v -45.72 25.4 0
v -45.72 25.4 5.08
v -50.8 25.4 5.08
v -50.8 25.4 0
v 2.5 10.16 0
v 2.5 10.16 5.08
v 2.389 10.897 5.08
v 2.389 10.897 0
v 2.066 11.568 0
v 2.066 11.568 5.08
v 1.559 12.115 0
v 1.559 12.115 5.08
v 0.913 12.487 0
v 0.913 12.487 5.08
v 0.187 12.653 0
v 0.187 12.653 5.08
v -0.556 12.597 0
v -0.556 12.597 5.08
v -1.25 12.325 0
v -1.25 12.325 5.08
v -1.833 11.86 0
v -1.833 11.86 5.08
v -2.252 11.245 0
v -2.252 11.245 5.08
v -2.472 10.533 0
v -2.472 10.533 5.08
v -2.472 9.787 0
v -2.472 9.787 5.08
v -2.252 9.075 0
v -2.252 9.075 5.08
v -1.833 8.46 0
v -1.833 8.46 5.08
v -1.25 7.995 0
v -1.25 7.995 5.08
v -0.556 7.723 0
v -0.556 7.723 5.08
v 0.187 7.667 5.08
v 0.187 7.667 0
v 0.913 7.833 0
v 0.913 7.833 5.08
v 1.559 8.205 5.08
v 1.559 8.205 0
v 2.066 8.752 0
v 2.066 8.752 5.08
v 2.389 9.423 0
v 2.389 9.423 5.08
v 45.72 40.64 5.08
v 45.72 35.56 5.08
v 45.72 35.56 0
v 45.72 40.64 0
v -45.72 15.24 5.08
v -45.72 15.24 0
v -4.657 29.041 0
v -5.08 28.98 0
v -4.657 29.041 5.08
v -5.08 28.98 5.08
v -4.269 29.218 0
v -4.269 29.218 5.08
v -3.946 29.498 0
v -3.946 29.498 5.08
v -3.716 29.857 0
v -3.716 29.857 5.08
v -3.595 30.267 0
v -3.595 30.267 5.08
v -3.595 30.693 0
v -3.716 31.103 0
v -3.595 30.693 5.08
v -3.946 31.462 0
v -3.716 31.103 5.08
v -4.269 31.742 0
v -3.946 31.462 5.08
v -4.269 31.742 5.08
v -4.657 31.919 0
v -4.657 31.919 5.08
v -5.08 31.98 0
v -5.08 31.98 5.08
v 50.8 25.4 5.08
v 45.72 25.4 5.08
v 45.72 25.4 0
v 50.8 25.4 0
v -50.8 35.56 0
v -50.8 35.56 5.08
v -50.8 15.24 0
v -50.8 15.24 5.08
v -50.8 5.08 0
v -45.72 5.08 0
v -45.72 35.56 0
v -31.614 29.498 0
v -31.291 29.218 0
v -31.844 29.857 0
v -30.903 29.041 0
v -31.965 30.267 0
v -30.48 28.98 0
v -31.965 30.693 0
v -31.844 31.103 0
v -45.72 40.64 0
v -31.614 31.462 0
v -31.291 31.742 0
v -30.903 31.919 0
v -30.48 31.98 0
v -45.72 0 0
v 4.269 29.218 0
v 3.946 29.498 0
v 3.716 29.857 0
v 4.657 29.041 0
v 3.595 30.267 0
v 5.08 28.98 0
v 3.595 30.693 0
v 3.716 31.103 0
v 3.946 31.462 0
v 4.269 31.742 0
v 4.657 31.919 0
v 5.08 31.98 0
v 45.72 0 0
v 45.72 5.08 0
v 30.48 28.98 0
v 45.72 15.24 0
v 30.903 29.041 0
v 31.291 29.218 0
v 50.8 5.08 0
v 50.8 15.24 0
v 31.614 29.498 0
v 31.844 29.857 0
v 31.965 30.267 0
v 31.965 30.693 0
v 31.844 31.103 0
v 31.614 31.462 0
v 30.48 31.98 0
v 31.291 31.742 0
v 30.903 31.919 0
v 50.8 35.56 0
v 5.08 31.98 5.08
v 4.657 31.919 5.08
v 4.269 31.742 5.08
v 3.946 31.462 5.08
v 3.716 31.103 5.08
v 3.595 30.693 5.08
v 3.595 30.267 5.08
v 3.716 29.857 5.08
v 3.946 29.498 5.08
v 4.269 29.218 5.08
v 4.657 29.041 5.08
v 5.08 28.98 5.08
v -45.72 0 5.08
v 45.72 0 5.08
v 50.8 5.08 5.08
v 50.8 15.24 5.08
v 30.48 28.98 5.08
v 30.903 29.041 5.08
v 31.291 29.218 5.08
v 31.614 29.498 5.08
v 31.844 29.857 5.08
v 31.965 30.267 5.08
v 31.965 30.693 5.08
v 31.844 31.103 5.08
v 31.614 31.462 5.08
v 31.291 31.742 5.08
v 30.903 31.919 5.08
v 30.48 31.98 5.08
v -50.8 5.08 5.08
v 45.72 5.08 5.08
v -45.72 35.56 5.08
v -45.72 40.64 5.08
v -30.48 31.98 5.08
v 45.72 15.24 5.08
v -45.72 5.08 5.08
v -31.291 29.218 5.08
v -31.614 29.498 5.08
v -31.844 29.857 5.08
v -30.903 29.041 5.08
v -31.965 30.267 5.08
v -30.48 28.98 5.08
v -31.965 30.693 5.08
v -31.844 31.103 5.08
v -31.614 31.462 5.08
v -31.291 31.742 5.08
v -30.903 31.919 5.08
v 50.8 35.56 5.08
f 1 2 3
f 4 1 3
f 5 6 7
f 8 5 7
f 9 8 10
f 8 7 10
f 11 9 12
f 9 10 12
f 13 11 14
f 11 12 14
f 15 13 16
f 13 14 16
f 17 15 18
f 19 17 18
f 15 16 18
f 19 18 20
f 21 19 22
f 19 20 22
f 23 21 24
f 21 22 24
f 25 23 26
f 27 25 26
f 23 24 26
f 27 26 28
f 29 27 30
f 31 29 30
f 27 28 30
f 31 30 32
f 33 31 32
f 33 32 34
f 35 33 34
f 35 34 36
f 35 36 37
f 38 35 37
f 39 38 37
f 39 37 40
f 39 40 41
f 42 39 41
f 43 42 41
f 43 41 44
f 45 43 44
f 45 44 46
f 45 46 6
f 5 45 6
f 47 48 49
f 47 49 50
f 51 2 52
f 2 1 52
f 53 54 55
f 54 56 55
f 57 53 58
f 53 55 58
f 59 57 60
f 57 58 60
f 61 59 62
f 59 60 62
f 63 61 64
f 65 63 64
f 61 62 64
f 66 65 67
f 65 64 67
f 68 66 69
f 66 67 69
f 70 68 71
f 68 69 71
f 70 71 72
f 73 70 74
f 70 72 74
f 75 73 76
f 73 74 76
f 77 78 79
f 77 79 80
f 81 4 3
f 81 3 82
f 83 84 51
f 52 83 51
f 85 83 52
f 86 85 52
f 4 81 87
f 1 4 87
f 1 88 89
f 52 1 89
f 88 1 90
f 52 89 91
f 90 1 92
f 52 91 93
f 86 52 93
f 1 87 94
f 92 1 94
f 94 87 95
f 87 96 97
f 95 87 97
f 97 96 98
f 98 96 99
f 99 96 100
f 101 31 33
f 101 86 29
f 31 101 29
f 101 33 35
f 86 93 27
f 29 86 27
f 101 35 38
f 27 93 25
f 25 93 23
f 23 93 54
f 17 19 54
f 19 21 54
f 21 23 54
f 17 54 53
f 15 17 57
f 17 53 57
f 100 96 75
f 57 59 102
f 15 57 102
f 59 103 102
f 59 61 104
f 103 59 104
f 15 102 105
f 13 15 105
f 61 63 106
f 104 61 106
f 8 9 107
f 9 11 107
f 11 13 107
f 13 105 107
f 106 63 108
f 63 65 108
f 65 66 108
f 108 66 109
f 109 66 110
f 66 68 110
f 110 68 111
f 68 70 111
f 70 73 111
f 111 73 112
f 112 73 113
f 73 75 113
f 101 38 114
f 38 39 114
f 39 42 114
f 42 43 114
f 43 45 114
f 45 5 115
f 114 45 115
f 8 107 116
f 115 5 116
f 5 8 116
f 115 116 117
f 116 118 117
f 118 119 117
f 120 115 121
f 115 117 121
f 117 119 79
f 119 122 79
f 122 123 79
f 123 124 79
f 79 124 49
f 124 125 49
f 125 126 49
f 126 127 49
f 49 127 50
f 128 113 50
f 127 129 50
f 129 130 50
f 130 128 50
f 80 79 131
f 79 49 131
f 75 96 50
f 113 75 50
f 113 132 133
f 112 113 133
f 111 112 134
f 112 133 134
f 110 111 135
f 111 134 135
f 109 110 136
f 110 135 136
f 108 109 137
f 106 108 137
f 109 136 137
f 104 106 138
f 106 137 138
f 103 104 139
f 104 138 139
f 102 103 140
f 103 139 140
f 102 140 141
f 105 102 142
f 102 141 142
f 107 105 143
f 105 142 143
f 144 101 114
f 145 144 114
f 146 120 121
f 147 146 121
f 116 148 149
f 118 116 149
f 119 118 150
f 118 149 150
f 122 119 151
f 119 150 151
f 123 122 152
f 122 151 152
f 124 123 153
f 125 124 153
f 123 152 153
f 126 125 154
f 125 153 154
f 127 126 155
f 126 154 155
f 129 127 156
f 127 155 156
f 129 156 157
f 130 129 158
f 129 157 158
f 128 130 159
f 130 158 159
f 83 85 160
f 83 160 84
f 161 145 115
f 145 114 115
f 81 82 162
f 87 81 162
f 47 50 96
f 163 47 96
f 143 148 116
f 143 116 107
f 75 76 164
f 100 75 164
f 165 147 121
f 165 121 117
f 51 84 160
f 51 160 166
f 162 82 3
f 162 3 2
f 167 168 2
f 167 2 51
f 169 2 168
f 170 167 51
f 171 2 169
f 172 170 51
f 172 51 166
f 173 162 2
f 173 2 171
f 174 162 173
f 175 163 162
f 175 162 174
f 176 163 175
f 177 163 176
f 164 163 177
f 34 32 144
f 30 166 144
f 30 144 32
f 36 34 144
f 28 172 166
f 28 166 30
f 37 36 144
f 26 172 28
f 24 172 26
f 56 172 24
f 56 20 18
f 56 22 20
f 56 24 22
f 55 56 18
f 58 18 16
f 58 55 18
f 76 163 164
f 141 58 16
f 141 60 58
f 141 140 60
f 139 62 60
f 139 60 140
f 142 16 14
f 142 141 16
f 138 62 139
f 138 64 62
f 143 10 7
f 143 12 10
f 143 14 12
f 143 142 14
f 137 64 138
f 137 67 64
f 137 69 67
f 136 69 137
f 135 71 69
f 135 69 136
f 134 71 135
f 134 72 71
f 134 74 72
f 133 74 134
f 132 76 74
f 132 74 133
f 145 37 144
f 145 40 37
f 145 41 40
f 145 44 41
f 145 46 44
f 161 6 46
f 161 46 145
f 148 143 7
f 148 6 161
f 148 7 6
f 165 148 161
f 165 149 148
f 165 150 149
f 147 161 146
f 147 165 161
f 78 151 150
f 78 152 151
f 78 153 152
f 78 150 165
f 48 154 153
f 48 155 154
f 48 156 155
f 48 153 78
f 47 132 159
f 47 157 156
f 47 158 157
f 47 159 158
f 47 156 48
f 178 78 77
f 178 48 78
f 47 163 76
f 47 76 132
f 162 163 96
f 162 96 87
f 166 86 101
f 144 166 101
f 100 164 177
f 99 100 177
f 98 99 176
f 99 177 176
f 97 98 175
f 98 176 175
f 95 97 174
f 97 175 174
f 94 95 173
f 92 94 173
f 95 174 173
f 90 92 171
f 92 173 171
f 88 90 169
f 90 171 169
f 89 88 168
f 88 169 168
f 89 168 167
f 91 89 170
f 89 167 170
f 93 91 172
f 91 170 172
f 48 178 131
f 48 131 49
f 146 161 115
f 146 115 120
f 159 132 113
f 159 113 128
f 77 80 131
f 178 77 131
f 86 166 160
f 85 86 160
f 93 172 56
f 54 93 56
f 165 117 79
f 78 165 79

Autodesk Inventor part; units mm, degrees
ref_plane "YZ Plane" through (0, 0, 0) normal (1, 0, 0) x (0, 1, 0)
ref_plane "XZ Plane" through (0, 0, 0) normal (0, 1, 0) x (-1, 0, 0)
ref_plane "XY Plane" through (0, 0, 0) normal (0, 0, 1) x (1, 0, 0)
sketch "Sketch1" plane through (0, 0, 0) normal (0, 0, 1) x (1, 0, 0)
  line L0 (45.72, 0) -> (45.72, 40.64)
  line L1 (45.72, 40.64) -> (-45.72, 40.64)
  line L2 (-45.72, 40.64) -> (-45.72, 9.301)
  line L3 (-45.72, 5.08) -> (-50.8, 5.08)
  line L4 (-50.8, 5.08) -> (-50.8, 15.24)
  line L5 (-50.8, 15.24) -> (-45.72, 15.24)
  line L6 (-45.72, 15.24) -> (-45.72, 5.08)
  line L7 (-45.72, 25.4) -> (-50.8, 25.4)
  line L8 (-50.8, 25.4) -> (-50.8, 35.56)
  line L9 (-50.8, 35.56) -> (-45.72, 35.56)
  line L10 (-45.72, 35.56) -> (-45.72, 25.4)
  line L11 (-45.72, 45.72) -> (-50.8, 45.72)
  line L12 (-50.8, 45.72) -> (-50.8, 55.88)
  line L13 (-50.8, 55.88) -> (-45.72, 55.88)
  line L14 (-45.72, 55.88) -> (-45.72, 45.72)
  line L15 (0, 40.64) -> (0, 0) construction
  line L16 (45.72, 40.64) -> (45.72, 0)
  line L17 (45.72, 5.08) -> (50.8, 5.08)
  line L18 (50.8, 5.08) -> (50.8, 15.24)
  line L19 (50.8, 15.24) -> (45.72, 15.24)
  line L20 (45.72, 15.24) -> (45.72, 5.08)
  line L21 (45.72, 25.4) -> (50.8, 25.4)
  line L22 (50.8, 25.4) -> (50.8, 35.56)
  line L23 (50.8, 35.56) -> (45.72, 35.56)
  line L24 (45.72, 35.56) -> (45.72, 25.4)
  line L25 (45.72, 45.72) -> (50.8, 45.72)
  line L26 (50.8, 45.72) -> (50.8, 55.88)
  line L27 (50.8, 55.88) -> (45.72, 55.88)
  line L28 (45.72, 55.88) -> (45.72, 45.72)
  line L29 (-45.72, 5.08) -> (-45.72, 0)
  line L30 (-45.72, 0) -> (45.72, 0)
  line L31 (45.72, 40.64) -> (-45.72, 40.64)
  line L32 (-45.72, 40.64) -> (-45.72, 0)
  line L33 (-45.72, 0) -> (45.72, 0)
  line L34 (45.72, 0) -> (45.72, 40.64)
  dimension "d0" = 91.44
  dimension "d2" = 10.16
  dimension "d3" = 5.08
  dimension "d7" = 20.32
  dimension "d14" = 5.08
  dimension "d15" = 40.64
extrude "Extrusion2" add sketch "Sketch1" along normal blind 5.08 contours L30 L29 L6 L2 L1 L0 | L0 L19 L18 L17 | L3 L4 L5 L2 L6 | L0 L23 L22 L21 | L7 L8 L9 L2
sketch "Sketch4" plane through (0, 0, 5.08) normal (0, 0, 1) x (1, 0, 0)
  line L0 (45.72, 40.64) -> (-45.72, 40.64) construction
  line L1 (-30.48, 30.48) -> (-5.08, 30.48)
  line L2 (-30.48, 28.98) -> (-5.08, 28.98)
  line L3 (-5.08, 31.98) -> (-30.48, 31.98)
  arc A0 (-30.48, 31.98) -> (-30.48, 28.98) centre (-30.48, 30.48) ccw
  arc A1 (-5.08, 28.98) -> (-5.08, 31.98) centre (-5.08, 30.48) ccw
  line L4 (30.48, 30.48) -> (5.08, 30.48)
  line L5 (30.48, 28.98) -> (5.08, 28.98)
  line L6 (5.08, 31.98) -> (30.48, 31.98)
  arc A2 (30.48, 28.98) -> (30.48, 31.98) centre (30.48, 30.48) ccw
  arc A3 (5.08, 31.98) -> (5.08, 28.98) centre (5.08, 30.48) ccw
  line L7 (-50.8, 25.4) -> (-45.72, 25.4) projected
  line L8 (-45.72, 25.4) -> (-45.72, 15.24) projected
  line L9 (-45.72, 15.24) -> (-50.8, 15.24) projected
  line L10 (-50.8, 15.24) -> (-50.8, 5.08) projected
  line L11 (-50.8, 5.08) -> (-45.72, 5.08) projected
  line L12 (-45.72, 5.08) -> (-45.72, 0) projected
  line L13 (-45.72, 0) -> (45.72, 0) projected
  line L14 (45.72, 0) -> (45.72, 5.08) projected
  line L15 (45.72, 5.08) -> (50.8, 5.08) projected
  line L16 (50.8, 5.08) -> (50.8, 15.24) projected
  line L17 (50.8, 15.24) -> (45.72, 15.24) projected
  line L18 (45.72, 15.24) -> (45.72, 25.4) projected
  line L19 (45.72, 25.4) -> (50.8, 25.4) projected
  line L20 (50.8, 25.4) -> (50.8, 35.56) projected
  line L21 (50.8, 35.56) -> (45.72, 35.56) projected
  line L22 (45.72, 35.56) -> (45.72, 40.64) projected
  line L23 (45.72, 40.64) -> (-45.72, 40.64) projected
  line L24 (-45.72, 40.64) -> (-45.72, 35.56) projected
  line L25 (-45.72, 35.56) -> (-50.8, 35.56) projected
  line L26 (-50.8, 35.56) -> (-50.8, 25.4) projected
  line L27 (0, 40.64) -> (0, 0) construction
  circle A4 centre (0, 10.16) radius 2.5
  point P0 (-17.78, 30.48)
  point P1 (17.78, 30.48)
  point P2 (17.78, 30.48)
  dimension "d25" = 3
  dimension "d26" = 25.4
  dimension "d32" = 17.78
  dimension "d33" = 17.78
  dimension "d34" = 25.4
  dimension "d35" = 10.16
  dimension "d36" = 1.5
  dimension "d37" = 1.5
  dimension "d38" = 5
  dimension "d39" = 10.16
extrude "Extrusion5" cut sketch "Sketch4" against normal blind 25.4 contours A0 L3 A1 L2 | L5 A3 L6 A2 | A4
equation "\"d7\" = 2 * d2"
equation "\"d33\" = d32"
equation "\"d34\" = d26"
equation "\"d36\" = 0.5 * d25"
equation "\"d37\" = d36"
equation "\"d39\" = d35"
properties part number "EndPulleyMount" material "Wood (Birch)"
